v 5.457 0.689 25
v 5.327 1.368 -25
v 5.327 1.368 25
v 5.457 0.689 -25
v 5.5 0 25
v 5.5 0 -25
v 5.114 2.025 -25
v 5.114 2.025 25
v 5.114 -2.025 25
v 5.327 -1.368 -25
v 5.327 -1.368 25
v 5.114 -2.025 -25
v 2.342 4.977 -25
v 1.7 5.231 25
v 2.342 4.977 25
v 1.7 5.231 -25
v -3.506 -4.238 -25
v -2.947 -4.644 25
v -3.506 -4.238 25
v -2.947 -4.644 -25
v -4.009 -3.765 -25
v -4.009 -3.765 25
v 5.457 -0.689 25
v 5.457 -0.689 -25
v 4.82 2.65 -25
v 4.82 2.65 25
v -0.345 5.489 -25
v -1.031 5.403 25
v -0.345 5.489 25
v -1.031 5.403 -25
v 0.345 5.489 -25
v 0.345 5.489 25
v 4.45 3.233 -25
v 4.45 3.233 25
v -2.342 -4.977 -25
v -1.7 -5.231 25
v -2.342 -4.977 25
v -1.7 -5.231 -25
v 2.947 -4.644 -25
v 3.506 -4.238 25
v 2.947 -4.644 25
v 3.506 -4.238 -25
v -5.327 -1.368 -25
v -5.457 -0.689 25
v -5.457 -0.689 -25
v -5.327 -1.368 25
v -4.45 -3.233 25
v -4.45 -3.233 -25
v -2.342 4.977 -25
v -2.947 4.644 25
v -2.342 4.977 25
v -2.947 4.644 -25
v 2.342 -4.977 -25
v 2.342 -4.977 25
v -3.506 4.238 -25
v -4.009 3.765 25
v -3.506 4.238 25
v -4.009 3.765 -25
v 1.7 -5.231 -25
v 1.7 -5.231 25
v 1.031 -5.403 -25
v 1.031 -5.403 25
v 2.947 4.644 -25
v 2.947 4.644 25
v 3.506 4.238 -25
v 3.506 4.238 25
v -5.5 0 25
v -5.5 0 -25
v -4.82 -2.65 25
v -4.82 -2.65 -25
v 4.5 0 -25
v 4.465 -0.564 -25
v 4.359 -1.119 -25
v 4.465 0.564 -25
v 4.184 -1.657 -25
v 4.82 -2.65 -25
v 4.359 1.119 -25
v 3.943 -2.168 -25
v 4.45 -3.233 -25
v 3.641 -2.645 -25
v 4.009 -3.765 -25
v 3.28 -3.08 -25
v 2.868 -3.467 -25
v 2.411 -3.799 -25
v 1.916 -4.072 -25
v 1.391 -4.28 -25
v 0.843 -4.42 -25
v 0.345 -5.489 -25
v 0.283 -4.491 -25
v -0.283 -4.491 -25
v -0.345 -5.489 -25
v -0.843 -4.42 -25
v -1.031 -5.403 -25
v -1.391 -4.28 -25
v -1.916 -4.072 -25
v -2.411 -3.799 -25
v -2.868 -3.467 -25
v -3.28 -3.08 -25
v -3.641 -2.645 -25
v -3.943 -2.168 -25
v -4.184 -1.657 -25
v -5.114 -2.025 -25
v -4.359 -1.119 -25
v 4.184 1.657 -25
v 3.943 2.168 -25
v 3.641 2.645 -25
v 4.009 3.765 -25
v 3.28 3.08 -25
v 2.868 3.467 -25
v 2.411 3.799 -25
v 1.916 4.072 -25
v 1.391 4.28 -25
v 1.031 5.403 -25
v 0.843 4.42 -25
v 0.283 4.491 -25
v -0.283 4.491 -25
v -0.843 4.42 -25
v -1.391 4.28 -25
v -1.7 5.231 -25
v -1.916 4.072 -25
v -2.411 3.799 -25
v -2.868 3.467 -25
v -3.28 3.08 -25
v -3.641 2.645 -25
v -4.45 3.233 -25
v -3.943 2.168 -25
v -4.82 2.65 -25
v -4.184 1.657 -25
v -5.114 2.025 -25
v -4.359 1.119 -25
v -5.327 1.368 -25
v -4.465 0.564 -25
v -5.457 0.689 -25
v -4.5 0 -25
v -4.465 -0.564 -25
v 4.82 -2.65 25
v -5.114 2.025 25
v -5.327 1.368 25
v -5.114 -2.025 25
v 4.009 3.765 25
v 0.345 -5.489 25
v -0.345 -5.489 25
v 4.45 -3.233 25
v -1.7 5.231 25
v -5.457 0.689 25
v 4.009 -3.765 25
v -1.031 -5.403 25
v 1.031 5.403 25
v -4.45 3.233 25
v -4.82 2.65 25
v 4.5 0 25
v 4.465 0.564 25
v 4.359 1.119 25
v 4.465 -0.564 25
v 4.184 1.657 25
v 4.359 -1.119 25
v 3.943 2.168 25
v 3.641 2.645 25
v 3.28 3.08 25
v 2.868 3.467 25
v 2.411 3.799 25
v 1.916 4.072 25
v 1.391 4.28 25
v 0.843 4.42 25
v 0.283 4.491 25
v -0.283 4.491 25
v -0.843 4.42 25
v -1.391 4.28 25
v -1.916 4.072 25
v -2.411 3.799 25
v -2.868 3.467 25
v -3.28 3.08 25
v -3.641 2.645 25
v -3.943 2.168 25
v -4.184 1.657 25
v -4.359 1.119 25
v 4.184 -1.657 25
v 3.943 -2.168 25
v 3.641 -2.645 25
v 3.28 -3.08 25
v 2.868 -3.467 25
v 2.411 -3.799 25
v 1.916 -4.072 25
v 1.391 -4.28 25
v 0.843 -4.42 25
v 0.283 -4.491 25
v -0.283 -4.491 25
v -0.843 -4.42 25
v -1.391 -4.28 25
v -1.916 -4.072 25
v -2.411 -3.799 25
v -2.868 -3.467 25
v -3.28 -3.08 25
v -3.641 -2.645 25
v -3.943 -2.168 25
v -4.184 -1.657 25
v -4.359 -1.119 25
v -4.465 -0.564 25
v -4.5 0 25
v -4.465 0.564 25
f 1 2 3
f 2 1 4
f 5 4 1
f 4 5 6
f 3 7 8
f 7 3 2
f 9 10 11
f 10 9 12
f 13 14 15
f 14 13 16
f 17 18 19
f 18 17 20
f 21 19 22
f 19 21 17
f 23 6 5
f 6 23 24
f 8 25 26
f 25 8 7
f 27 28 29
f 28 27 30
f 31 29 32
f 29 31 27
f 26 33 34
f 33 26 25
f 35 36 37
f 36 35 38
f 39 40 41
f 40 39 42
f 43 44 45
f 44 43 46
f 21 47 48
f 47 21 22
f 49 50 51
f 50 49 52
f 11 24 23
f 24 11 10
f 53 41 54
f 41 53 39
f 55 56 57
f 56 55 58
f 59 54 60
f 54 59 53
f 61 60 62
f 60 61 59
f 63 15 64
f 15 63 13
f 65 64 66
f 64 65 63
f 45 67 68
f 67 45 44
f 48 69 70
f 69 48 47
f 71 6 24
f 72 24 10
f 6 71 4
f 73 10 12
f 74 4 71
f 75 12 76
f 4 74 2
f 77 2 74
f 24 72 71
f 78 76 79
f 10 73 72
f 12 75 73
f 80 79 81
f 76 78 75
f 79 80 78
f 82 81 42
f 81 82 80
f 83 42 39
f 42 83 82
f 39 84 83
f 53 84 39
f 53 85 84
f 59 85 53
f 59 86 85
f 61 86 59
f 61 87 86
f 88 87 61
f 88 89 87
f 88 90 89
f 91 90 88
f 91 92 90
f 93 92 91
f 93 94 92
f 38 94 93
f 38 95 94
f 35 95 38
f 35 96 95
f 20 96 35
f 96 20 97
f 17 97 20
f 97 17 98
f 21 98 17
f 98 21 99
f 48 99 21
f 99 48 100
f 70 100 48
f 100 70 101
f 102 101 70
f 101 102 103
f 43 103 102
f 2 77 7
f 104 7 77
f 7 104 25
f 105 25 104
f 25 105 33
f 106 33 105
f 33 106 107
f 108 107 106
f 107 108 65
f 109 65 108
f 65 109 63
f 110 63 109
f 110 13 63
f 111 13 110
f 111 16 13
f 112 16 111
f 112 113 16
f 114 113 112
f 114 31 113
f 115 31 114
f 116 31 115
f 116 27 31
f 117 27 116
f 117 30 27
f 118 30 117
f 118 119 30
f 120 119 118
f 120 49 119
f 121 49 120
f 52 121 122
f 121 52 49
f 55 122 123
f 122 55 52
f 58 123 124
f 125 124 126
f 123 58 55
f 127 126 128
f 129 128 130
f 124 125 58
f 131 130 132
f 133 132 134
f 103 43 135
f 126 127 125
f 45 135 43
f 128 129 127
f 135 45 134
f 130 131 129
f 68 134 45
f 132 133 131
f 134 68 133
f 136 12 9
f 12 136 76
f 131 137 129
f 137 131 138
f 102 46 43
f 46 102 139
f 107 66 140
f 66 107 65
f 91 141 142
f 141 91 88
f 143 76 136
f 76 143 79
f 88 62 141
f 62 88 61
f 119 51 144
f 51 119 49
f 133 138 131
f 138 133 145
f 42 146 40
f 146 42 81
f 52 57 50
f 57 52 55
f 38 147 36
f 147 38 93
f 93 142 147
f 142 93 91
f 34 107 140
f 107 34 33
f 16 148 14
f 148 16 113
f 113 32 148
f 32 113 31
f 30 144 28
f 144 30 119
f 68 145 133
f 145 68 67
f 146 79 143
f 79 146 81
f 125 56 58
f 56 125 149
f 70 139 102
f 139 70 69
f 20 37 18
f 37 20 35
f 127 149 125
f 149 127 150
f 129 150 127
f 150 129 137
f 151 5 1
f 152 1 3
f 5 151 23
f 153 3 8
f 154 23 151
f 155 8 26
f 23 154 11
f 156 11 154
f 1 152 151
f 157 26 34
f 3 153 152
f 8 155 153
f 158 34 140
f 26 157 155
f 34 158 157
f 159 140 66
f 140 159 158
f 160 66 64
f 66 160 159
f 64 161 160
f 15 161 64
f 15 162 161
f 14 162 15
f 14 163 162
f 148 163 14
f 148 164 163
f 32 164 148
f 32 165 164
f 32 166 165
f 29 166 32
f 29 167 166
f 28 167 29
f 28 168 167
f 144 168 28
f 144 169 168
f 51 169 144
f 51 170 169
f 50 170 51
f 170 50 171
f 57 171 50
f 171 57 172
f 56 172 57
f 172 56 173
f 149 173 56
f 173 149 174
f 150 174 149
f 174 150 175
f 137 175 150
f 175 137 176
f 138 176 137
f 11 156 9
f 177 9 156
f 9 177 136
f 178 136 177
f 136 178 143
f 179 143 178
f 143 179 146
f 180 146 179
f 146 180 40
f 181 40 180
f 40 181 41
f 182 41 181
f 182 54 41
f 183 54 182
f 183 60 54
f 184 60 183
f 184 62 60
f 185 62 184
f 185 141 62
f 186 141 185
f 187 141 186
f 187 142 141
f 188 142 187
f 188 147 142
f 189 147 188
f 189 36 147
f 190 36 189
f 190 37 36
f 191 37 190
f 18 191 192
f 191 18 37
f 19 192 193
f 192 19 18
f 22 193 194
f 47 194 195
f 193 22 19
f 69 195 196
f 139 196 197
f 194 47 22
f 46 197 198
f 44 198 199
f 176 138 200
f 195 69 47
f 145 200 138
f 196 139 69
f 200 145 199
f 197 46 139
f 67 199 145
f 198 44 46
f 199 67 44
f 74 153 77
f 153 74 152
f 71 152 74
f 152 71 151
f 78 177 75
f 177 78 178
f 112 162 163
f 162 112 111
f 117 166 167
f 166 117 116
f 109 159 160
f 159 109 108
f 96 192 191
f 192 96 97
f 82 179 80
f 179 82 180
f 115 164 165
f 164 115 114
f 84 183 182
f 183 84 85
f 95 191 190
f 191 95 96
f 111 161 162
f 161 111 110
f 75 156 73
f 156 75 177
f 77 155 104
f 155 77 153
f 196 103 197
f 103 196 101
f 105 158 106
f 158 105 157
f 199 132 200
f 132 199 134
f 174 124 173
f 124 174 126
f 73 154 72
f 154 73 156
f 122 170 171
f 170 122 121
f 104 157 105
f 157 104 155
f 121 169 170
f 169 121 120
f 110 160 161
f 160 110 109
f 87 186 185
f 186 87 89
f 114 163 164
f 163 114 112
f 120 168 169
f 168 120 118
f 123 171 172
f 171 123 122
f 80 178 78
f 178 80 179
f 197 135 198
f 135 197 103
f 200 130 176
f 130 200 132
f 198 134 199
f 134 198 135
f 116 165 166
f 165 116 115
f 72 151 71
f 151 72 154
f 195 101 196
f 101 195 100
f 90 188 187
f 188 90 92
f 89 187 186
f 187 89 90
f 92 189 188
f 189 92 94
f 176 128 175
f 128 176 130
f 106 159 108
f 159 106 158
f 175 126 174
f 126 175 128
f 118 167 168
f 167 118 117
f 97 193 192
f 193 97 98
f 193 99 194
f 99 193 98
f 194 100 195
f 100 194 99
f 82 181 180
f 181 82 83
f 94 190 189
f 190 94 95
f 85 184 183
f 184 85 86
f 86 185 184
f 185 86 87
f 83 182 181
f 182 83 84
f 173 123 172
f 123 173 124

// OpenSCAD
$fn = 50;


difference() {
	union() {
		translate(v = [0, 0, -25.0000000000]) {
			cylinder(h = 50, r = 5.5000000000);
		}
	}
	union() {
		translate(v = [0, 0, -100.0000000000]) {
			cylinder(h = 200, r = 4.5000000000);
		}
	}
}
